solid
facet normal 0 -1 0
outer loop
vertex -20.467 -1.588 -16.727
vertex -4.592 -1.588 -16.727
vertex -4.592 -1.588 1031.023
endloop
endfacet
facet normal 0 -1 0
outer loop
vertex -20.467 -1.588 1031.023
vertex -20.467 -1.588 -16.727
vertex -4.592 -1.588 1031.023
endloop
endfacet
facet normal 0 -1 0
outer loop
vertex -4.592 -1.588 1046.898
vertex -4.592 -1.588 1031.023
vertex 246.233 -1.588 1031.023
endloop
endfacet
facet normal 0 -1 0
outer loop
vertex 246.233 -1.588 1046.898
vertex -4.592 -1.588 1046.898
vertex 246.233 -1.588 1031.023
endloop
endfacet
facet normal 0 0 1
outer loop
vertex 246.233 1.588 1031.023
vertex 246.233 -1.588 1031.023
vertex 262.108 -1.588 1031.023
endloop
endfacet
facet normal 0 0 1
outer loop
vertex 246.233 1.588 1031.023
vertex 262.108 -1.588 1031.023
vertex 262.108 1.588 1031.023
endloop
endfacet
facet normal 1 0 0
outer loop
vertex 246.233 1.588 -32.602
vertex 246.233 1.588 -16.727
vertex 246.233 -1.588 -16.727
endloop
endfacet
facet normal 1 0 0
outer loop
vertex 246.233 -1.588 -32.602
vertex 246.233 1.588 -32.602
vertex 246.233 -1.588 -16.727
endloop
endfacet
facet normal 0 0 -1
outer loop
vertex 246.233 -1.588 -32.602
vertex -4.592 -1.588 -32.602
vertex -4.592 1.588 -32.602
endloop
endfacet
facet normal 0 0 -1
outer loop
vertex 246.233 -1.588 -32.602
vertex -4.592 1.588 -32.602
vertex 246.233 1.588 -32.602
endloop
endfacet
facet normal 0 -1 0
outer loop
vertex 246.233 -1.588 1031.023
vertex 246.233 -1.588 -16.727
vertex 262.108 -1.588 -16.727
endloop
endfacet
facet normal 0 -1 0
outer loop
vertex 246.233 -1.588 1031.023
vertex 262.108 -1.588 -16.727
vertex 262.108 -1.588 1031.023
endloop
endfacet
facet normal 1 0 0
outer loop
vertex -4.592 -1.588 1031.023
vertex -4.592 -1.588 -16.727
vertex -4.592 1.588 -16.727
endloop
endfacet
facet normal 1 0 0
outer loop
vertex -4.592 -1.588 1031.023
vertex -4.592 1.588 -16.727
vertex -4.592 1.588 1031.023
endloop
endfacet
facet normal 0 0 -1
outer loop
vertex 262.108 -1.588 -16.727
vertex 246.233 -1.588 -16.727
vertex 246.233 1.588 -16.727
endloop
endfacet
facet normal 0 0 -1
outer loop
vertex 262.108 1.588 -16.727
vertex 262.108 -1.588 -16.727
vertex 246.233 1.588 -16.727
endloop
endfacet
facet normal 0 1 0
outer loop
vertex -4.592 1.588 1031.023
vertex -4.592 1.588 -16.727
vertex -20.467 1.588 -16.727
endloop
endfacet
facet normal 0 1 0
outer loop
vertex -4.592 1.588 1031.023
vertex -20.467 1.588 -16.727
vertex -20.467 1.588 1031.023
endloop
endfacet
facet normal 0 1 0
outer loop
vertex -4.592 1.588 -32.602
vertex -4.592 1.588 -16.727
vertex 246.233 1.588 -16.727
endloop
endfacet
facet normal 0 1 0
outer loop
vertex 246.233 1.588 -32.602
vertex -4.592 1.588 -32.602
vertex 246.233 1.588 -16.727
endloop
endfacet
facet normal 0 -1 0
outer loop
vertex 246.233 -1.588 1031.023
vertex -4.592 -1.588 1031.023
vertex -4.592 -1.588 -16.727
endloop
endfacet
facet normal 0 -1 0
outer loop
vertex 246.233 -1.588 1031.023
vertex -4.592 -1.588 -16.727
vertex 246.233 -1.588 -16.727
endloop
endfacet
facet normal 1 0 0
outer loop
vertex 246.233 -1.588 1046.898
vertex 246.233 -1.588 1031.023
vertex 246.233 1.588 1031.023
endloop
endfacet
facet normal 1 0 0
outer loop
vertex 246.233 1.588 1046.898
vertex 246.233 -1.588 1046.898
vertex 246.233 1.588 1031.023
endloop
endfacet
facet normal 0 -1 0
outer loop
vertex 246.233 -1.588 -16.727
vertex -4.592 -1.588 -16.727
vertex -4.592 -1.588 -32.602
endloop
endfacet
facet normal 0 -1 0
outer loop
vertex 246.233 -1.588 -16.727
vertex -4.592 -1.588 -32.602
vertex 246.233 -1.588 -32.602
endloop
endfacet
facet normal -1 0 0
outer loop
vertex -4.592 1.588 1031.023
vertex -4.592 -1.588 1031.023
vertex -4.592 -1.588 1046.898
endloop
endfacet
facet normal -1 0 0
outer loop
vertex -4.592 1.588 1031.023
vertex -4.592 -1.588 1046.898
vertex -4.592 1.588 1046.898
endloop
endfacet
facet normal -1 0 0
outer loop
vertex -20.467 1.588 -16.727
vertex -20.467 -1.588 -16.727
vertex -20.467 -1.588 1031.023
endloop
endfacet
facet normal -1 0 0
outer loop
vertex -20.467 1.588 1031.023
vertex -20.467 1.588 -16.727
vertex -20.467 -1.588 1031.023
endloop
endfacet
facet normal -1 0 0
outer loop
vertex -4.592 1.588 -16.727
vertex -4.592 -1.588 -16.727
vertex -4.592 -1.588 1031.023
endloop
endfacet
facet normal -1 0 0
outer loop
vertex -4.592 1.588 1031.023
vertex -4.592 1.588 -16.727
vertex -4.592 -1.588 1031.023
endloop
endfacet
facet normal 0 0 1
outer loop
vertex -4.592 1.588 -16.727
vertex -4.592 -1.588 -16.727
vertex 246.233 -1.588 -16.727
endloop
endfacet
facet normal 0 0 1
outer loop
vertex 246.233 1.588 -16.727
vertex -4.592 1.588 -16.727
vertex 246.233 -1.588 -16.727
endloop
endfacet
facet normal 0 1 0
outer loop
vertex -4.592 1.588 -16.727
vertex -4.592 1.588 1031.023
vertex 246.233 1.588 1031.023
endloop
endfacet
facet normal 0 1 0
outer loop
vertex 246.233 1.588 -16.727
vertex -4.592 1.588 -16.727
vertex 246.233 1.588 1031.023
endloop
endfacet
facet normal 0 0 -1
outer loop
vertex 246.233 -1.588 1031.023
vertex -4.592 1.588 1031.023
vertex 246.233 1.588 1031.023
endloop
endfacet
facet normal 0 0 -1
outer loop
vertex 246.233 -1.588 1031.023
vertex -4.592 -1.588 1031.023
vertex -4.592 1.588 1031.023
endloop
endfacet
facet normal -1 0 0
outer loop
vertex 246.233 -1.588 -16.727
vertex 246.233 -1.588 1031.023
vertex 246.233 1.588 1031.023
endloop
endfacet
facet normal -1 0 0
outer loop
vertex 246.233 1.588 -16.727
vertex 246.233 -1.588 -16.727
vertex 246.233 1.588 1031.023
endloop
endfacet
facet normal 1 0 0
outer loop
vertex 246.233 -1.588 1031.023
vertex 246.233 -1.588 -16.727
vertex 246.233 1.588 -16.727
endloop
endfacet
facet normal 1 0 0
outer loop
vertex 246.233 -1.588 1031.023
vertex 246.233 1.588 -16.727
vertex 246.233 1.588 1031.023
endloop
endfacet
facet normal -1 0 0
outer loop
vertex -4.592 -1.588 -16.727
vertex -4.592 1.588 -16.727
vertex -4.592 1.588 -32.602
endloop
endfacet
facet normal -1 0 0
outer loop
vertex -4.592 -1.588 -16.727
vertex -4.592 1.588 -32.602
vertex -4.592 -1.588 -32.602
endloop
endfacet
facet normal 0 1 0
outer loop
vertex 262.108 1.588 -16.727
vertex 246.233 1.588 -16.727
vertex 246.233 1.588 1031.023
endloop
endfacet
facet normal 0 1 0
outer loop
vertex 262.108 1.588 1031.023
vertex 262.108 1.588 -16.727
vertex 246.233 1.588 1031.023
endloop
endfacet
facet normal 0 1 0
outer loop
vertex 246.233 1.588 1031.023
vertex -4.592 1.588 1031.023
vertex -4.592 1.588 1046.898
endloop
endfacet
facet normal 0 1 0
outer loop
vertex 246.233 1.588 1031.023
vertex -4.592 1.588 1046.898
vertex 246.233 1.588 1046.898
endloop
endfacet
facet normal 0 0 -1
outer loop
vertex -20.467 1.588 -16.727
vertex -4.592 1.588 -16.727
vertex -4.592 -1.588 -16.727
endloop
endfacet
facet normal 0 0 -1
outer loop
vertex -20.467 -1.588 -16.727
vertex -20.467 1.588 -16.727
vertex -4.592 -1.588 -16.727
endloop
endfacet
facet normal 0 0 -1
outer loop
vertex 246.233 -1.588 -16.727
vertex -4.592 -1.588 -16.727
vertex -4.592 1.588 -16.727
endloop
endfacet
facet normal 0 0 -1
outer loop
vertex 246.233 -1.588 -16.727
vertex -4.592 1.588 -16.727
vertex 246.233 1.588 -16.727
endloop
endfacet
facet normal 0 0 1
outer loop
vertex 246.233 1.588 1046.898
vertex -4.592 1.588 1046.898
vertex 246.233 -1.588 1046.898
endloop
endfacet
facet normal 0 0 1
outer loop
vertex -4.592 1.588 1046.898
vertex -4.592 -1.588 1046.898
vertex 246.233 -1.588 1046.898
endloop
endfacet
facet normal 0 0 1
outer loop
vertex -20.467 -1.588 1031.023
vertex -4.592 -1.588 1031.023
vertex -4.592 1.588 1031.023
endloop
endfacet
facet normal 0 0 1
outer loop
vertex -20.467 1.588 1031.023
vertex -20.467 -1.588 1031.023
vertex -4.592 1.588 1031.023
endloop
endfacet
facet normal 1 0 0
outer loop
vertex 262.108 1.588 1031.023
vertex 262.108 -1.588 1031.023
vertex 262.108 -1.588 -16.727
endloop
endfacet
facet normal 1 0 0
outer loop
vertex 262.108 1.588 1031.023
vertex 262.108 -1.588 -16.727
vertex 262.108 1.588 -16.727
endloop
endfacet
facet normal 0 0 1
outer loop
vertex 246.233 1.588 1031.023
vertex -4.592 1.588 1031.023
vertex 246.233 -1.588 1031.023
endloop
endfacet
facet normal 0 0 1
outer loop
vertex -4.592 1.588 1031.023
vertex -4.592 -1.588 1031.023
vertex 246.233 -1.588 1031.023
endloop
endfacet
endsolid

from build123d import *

# Parameters (mm, degrees)
F0_W     = 250.825
F0_H     = 1047.75
F1_DEPTH = 1.5875
F2_W     = 3.175
F2_H     = 1047.75
F3_DEPTH = 15.875
F4_DEPTH = 15.875
F5_DEPTH = 15.875
F6_DEPTH = 15.875


with BuildPart() as f1:
    # F0 (on Front) → F1 (new body, symmetric)
    with BuildSketch(Plane.XZ):
        with Locations((120.8200038359, 507.1482994068)):
            Rectangle(F0_W, F0_H)
    extrude(amount=F1_DEPTH, both=True)


with BuildPart() as f3:
    # F2 (on face) → F3 (new body)
    with BuildSketch(Plane.YZ.offset(246.2325038359)):
        with Locations((0, 507.1482994068)):
            Rectangle(F2_W, F2_H)
    extrude(amount=F3_DEPTH)


with BuildPart() as f4:
    # F4 (new): a face of the model
    f4_faces = [f1.part.faces().sort_by_distance(p)[0] for p in [
        (120.8200038359, 0, 1031.0232994068),
    ]]
    extrude(f4_faces, amount=F4_DEPTH)


with BuildPart() as f5:
    # F5 (new): a face of the model
    f5_faces = [f1.part.faces().sort_by_distance(p)[0] for p in [
        (-4.5924961641, 0, 507.1482994068),
    ]]
    extrude(f5_faces, amount=F5_DEPTH)


with BuildPart() as f6:
    # F6 (new): a face of the model
    f6_faces = [f1.part.faces().sort_by_distance(p)[0] for p in [
        (120.8200038359, 0, -16.7267005932),
    ]]
    extrude(f6_faces, amount=F6_DEPTH)


solid = Compound([f1.part, f3.part, f4.part, f5.part, f6.part])
